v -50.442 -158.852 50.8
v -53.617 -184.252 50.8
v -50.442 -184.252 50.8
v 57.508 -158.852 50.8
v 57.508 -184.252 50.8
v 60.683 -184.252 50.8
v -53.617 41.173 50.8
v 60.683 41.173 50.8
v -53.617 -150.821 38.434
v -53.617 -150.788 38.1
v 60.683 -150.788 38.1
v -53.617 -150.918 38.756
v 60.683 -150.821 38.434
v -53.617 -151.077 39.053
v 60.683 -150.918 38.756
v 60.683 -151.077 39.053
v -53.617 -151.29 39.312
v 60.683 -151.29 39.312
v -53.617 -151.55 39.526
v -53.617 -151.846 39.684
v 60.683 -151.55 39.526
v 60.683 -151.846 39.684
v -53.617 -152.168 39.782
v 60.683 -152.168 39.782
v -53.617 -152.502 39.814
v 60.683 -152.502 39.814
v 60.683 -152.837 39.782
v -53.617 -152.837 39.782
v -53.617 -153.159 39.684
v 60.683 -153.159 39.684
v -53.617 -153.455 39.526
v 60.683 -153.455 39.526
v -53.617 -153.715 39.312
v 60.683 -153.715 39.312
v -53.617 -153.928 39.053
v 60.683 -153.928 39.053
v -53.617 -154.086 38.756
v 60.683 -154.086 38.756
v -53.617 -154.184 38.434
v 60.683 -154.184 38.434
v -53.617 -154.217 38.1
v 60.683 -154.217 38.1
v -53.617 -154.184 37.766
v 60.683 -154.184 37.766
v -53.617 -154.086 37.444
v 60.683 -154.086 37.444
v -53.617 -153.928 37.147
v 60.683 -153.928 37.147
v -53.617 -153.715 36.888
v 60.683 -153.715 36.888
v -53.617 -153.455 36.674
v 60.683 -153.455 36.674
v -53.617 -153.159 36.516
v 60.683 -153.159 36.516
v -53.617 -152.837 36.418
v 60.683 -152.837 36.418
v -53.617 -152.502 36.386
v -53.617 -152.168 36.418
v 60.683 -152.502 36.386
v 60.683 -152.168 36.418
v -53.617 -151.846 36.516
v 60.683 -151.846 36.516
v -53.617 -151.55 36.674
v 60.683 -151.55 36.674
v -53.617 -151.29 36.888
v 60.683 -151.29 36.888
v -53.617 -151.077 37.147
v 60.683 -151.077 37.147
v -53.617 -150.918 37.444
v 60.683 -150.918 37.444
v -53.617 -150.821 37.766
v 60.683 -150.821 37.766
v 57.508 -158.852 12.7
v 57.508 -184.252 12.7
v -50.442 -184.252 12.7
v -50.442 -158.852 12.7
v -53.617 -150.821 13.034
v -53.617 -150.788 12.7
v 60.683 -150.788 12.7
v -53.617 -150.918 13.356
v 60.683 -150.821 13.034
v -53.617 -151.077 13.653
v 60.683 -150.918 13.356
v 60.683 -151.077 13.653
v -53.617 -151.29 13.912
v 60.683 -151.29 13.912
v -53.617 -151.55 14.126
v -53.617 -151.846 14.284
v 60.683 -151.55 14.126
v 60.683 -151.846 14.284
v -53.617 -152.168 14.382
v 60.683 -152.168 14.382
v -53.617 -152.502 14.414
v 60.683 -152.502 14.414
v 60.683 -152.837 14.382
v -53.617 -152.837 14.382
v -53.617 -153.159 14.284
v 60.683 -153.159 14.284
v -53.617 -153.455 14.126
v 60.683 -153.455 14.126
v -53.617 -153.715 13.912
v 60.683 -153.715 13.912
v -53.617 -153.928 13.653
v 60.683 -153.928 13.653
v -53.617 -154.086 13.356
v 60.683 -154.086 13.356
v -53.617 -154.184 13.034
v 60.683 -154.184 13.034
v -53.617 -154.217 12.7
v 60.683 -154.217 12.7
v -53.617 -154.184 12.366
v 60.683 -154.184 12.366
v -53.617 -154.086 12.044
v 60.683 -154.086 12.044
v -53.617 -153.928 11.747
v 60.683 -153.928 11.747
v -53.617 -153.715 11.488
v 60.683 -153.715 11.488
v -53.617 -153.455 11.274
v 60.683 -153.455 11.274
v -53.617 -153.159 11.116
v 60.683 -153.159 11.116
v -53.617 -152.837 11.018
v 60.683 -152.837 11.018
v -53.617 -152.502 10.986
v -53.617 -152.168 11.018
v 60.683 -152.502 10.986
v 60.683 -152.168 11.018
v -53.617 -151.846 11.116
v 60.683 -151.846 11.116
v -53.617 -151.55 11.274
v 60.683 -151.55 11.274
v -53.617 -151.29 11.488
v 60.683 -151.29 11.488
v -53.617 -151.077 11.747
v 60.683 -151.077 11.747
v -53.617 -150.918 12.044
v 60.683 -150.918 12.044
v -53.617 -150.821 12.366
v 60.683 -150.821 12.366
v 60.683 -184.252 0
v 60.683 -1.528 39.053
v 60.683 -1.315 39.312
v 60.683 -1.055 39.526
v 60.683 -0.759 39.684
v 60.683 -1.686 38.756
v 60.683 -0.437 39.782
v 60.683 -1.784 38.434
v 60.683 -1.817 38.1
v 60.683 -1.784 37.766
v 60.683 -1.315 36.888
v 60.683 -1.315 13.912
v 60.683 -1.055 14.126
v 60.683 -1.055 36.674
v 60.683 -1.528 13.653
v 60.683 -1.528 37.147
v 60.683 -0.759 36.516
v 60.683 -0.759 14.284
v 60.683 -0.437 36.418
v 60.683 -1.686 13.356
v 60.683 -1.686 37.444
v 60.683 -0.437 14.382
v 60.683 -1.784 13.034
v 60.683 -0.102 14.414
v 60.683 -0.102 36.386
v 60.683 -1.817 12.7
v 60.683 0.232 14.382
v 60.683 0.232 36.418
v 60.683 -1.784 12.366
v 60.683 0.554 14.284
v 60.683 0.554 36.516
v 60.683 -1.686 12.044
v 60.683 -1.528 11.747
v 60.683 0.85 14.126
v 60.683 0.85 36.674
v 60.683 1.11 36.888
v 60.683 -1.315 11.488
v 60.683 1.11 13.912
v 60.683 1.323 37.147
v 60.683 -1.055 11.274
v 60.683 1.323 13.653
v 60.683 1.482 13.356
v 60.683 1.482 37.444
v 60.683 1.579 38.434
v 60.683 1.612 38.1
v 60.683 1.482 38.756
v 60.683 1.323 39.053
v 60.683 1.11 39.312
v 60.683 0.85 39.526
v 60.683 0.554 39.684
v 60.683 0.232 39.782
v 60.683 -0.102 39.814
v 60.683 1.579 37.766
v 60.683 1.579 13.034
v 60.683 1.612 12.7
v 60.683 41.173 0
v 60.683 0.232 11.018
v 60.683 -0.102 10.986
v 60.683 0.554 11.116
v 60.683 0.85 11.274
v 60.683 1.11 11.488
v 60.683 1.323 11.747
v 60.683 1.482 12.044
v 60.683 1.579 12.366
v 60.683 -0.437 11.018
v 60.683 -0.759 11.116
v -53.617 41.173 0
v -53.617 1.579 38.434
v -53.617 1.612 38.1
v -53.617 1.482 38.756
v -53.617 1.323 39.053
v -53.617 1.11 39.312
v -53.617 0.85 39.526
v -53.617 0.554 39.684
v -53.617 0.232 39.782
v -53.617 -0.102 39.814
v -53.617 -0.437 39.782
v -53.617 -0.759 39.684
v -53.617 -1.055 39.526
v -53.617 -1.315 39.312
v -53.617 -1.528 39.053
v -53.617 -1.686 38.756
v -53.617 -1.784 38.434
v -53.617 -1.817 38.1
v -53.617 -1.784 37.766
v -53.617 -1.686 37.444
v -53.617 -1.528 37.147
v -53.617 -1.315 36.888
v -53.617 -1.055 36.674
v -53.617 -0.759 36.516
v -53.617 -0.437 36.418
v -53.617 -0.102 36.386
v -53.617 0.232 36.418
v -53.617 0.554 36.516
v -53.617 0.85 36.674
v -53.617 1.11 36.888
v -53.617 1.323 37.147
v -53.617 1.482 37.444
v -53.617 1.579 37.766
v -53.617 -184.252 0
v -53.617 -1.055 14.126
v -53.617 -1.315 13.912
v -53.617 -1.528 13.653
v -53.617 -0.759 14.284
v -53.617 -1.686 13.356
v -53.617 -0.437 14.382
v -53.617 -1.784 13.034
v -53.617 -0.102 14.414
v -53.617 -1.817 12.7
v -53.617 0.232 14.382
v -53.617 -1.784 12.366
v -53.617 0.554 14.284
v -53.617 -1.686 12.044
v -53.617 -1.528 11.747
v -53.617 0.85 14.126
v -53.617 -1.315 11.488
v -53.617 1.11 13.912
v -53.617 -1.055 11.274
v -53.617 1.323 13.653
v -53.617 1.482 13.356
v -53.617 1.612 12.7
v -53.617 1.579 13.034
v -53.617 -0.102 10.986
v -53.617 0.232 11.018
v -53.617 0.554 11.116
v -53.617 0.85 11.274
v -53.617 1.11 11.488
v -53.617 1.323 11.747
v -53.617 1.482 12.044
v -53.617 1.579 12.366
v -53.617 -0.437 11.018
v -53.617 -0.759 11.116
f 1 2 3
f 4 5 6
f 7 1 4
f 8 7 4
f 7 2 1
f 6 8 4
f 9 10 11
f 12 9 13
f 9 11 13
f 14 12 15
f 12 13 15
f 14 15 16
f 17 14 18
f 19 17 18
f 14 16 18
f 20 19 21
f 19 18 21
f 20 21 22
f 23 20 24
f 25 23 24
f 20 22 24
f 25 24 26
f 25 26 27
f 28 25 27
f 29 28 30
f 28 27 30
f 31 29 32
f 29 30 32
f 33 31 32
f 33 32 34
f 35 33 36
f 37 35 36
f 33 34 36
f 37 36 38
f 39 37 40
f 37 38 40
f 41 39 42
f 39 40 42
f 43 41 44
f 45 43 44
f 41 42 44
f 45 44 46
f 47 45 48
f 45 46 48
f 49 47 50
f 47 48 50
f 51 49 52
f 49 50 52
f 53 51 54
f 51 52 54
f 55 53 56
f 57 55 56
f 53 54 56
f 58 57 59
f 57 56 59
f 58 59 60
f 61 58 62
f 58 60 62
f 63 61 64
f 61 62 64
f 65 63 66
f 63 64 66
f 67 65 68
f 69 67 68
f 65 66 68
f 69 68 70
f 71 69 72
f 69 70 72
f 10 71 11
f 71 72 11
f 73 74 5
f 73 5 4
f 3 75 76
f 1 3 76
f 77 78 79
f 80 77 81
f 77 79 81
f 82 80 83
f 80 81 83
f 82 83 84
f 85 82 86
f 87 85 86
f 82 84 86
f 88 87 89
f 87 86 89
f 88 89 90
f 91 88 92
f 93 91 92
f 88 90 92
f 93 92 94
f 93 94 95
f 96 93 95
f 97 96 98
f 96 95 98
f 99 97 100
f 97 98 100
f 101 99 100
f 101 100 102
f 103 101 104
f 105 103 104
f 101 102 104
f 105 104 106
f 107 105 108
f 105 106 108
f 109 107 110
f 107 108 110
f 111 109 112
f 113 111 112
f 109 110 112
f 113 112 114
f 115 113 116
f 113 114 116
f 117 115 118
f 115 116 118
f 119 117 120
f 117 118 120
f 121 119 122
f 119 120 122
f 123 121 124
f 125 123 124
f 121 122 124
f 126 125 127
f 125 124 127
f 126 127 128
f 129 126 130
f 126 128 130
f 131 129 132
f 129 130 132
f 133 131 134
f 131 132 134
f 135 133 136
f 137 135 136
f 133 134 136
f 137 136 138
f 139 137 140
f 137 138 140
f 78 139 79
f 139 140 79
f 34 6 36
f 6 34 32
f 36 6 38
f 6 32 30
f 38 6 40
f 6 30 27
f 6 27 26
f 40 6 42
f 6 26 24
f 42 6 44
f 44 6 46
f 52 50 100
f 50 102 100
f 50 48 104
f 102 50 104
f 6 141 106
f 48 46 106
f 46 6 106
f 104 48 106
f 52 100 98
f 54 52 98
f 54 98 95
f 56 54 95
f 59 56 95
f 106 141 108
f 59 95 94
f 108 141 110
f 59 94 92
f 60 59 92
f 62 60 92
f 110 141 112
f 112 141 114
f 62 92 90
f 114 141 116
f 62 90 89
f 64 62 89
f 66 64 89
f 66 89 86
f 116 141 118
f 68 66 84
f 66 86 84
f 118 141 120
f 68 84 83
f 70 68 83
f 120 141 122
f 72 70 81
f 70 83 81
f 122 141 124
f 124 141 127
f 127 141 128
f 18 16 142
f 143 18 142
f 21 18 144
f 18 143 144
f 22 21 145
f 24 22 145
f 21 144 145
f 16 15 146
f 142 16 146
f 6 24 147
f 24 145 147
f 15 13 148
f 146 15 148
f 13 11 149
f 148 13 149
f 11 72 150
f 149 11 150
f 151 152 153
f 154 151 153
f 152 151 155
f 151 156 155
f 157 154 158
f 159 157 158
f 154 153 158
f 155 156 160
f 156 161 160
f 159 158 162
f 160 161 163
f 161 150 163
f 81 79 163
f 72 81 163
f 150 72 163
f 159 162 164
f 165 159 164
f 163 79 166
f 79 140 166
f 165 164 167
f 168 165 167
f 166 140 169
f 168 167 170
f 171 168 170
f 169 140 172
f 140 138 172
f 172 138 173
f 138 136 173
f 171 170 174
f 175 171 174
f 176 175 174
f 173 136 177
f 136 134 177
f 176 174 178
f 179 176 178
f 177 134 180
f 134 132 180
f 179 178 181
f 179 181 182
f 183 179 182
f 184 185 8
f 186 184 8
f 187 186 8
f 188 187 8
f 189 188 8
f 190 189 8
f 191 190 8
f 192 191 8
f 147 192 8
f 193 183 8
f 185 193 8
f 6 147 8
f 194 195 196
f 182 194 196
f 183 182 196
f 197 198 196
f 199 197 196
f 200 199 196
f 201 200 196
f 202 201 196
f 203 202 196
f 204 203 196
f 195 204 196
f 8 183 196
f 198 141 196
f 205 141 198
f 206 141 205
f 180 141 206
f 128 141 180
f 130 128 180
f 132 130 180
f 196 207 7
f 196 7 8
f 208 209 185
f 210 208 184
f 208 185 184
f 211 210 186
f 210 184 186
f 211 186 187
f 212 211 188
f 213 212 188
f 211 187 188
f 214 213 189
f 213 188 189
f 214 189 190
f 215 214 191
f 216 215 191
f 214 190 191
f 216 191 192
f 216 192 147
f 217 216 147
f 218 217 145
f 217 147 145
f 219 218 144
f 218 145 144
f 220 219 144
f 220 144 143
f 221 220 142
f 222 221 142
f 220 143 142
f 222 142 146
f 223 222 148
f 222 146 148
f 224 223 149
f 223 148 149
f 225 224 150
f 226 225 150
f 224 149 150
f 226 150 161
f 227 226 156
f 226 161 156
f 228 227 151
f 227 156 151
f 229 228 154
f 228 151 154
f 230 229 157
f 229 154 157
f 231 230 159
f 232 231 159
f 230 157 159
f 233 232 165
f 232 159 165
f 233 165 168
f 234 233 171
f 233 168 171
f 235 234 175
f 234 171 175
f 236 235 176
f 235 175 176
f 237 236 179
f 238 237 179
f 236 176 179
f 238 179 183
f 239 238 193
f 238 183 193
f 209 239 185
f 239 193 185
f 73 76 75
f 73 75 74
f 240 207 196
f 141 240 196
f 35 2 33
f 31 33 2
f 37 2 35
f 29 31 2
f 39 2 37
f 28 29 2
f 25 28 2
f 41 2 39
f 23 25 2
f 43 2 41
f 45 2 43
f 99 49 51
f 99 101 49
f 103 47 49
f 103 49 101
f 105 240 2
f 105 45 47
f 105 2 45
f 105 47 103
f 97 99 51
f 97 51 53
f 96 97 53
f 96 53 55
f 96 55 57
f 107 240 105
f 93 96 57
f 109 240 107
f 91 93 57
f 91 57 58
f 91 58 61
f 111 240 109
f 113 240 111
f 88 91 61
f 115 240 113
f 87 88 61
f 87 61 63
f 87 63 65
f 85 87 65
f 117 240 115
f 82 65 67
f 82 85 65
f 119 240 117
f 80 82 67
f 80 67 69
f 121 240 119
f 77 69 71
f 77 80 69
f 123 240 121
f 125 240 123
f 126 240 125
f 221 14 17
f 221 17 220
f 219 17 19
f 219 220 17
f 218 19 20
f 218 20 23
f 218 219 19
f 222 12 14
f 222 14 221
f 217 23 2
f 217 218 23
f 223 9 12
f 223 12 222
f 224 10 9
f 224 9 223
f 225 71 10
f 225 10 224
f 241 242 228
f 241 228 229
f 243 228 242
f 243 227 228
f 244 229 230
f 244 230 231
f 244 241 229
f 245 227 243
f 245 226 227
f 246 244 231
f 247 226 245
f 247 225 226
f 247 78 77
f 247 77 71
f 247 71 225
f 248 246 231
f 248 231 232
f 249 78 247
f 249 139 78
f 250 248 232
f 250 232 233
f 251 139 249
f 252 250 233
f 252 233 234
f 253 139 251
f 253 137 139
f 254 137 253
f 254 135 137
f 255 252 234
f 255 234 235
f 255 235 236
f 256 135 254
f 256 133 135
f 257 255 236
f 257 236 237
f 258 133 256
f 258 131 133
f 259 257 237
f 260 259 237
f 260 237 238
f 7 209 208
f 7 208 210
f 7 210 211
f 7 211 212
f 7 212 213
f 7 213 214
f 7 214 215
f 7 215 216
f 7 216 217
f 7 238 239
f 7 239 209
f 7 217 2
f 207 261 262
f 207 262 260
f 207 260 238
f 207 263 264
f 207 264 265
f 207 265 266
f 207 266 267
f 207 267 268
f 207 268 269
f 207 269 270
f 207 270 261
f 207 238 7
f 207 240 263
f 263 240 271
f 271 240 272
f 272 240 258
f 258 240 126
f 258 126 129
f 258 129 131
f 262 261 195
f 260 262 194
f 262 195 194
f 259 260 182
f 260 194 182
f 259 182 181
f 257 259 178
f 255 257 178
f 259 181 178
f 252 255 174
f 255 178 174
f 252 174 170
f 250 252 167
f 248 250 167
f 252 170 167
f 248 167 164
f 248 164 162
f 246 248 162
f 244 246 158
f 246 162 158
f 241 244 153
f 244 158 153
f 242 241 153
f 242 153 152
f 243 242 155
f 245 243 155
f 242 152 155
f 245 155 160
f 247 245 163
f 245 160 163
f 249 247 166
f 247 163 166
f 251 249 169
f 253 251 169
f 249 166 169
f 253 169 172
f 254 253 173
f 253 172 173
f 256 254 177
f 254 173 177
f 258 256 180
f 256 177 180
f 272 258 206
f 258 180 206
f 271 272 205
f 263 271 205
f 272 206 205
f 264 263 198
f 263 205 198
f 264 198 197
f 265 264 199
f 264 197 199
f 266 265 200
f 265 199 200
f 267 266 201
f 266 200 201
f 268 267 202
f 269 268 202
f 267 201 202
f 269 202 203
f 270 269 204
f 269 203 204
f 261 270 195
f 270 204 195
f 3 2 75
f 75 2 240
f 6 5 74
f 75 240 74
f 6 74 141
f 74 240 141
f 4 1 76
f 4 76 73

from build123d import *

# Parameters (mm, degrees)
SKETCH1_W           = 114.3
SKETCH1_H           = 225.425
BOSS_EXTRUDE1_DEPTH = 50.8
SKETCH2_W           = 107.95
SKETCH2_H           = 25.4
CUT_EXTRUDE1_DEPTH  = 38.1
SKETCH4_R           = 1.7145
CUT_EXTRUDE2_DEPTH  = 114.3


with BuildPart() as part:
    # Sketch1 → Boss-Extrude1 (new body)
    with BuildSketch(Plane.XY):
        with Locations((3.533467742, -71.539919355)):
            Rectangle(SKETCH1_W, SKETCH1_H)
    extrude(amount=BOSS_EXTRUDE1_DEPTH)

    # Sketch2 → Cut-Extrude1 (cut)
    with BuildSketch(Plane.XY.offset(50.8)):
        with Locations((3.533467742, -171.552419355)):
            Rectangle(SKETCH2_W, SKETCH2_H)
    extrude(amount=-CUT_EXTRUDE1_DEPTH, mode=Mode.SUBTRACT)

    # Sketch4 → Cut-Extrude2 (cut)
    with BuildSketch(Plane(origin=(60.683467742, 0, 0), x_dir=(0, 0, -1), z_dir=(1, 0, 0))):
        with Locations(Location((-12.7, -152.502419355, 0), (0, 0, 90))):
            Circle(SKETCH4_R)
        with Locations(Location((-38.1, -152.502419355, 0), (0, 0, 90))):
            Circle(SKETCH4_R)
        with Locations(Location((-38.1, -0.102419355, 0), (0, 0, 90))):
            Circle(SKETCH4_R)
        with Locations(Location((-12.7, -0.102419355, 0), (0, 0, 90))):
            Circle(SKETCH4_R)
    extrude(amount=-CUT_EXTRUDE2_DEPTH, mode=Mode.SUBTRACT)


solid = part.part
